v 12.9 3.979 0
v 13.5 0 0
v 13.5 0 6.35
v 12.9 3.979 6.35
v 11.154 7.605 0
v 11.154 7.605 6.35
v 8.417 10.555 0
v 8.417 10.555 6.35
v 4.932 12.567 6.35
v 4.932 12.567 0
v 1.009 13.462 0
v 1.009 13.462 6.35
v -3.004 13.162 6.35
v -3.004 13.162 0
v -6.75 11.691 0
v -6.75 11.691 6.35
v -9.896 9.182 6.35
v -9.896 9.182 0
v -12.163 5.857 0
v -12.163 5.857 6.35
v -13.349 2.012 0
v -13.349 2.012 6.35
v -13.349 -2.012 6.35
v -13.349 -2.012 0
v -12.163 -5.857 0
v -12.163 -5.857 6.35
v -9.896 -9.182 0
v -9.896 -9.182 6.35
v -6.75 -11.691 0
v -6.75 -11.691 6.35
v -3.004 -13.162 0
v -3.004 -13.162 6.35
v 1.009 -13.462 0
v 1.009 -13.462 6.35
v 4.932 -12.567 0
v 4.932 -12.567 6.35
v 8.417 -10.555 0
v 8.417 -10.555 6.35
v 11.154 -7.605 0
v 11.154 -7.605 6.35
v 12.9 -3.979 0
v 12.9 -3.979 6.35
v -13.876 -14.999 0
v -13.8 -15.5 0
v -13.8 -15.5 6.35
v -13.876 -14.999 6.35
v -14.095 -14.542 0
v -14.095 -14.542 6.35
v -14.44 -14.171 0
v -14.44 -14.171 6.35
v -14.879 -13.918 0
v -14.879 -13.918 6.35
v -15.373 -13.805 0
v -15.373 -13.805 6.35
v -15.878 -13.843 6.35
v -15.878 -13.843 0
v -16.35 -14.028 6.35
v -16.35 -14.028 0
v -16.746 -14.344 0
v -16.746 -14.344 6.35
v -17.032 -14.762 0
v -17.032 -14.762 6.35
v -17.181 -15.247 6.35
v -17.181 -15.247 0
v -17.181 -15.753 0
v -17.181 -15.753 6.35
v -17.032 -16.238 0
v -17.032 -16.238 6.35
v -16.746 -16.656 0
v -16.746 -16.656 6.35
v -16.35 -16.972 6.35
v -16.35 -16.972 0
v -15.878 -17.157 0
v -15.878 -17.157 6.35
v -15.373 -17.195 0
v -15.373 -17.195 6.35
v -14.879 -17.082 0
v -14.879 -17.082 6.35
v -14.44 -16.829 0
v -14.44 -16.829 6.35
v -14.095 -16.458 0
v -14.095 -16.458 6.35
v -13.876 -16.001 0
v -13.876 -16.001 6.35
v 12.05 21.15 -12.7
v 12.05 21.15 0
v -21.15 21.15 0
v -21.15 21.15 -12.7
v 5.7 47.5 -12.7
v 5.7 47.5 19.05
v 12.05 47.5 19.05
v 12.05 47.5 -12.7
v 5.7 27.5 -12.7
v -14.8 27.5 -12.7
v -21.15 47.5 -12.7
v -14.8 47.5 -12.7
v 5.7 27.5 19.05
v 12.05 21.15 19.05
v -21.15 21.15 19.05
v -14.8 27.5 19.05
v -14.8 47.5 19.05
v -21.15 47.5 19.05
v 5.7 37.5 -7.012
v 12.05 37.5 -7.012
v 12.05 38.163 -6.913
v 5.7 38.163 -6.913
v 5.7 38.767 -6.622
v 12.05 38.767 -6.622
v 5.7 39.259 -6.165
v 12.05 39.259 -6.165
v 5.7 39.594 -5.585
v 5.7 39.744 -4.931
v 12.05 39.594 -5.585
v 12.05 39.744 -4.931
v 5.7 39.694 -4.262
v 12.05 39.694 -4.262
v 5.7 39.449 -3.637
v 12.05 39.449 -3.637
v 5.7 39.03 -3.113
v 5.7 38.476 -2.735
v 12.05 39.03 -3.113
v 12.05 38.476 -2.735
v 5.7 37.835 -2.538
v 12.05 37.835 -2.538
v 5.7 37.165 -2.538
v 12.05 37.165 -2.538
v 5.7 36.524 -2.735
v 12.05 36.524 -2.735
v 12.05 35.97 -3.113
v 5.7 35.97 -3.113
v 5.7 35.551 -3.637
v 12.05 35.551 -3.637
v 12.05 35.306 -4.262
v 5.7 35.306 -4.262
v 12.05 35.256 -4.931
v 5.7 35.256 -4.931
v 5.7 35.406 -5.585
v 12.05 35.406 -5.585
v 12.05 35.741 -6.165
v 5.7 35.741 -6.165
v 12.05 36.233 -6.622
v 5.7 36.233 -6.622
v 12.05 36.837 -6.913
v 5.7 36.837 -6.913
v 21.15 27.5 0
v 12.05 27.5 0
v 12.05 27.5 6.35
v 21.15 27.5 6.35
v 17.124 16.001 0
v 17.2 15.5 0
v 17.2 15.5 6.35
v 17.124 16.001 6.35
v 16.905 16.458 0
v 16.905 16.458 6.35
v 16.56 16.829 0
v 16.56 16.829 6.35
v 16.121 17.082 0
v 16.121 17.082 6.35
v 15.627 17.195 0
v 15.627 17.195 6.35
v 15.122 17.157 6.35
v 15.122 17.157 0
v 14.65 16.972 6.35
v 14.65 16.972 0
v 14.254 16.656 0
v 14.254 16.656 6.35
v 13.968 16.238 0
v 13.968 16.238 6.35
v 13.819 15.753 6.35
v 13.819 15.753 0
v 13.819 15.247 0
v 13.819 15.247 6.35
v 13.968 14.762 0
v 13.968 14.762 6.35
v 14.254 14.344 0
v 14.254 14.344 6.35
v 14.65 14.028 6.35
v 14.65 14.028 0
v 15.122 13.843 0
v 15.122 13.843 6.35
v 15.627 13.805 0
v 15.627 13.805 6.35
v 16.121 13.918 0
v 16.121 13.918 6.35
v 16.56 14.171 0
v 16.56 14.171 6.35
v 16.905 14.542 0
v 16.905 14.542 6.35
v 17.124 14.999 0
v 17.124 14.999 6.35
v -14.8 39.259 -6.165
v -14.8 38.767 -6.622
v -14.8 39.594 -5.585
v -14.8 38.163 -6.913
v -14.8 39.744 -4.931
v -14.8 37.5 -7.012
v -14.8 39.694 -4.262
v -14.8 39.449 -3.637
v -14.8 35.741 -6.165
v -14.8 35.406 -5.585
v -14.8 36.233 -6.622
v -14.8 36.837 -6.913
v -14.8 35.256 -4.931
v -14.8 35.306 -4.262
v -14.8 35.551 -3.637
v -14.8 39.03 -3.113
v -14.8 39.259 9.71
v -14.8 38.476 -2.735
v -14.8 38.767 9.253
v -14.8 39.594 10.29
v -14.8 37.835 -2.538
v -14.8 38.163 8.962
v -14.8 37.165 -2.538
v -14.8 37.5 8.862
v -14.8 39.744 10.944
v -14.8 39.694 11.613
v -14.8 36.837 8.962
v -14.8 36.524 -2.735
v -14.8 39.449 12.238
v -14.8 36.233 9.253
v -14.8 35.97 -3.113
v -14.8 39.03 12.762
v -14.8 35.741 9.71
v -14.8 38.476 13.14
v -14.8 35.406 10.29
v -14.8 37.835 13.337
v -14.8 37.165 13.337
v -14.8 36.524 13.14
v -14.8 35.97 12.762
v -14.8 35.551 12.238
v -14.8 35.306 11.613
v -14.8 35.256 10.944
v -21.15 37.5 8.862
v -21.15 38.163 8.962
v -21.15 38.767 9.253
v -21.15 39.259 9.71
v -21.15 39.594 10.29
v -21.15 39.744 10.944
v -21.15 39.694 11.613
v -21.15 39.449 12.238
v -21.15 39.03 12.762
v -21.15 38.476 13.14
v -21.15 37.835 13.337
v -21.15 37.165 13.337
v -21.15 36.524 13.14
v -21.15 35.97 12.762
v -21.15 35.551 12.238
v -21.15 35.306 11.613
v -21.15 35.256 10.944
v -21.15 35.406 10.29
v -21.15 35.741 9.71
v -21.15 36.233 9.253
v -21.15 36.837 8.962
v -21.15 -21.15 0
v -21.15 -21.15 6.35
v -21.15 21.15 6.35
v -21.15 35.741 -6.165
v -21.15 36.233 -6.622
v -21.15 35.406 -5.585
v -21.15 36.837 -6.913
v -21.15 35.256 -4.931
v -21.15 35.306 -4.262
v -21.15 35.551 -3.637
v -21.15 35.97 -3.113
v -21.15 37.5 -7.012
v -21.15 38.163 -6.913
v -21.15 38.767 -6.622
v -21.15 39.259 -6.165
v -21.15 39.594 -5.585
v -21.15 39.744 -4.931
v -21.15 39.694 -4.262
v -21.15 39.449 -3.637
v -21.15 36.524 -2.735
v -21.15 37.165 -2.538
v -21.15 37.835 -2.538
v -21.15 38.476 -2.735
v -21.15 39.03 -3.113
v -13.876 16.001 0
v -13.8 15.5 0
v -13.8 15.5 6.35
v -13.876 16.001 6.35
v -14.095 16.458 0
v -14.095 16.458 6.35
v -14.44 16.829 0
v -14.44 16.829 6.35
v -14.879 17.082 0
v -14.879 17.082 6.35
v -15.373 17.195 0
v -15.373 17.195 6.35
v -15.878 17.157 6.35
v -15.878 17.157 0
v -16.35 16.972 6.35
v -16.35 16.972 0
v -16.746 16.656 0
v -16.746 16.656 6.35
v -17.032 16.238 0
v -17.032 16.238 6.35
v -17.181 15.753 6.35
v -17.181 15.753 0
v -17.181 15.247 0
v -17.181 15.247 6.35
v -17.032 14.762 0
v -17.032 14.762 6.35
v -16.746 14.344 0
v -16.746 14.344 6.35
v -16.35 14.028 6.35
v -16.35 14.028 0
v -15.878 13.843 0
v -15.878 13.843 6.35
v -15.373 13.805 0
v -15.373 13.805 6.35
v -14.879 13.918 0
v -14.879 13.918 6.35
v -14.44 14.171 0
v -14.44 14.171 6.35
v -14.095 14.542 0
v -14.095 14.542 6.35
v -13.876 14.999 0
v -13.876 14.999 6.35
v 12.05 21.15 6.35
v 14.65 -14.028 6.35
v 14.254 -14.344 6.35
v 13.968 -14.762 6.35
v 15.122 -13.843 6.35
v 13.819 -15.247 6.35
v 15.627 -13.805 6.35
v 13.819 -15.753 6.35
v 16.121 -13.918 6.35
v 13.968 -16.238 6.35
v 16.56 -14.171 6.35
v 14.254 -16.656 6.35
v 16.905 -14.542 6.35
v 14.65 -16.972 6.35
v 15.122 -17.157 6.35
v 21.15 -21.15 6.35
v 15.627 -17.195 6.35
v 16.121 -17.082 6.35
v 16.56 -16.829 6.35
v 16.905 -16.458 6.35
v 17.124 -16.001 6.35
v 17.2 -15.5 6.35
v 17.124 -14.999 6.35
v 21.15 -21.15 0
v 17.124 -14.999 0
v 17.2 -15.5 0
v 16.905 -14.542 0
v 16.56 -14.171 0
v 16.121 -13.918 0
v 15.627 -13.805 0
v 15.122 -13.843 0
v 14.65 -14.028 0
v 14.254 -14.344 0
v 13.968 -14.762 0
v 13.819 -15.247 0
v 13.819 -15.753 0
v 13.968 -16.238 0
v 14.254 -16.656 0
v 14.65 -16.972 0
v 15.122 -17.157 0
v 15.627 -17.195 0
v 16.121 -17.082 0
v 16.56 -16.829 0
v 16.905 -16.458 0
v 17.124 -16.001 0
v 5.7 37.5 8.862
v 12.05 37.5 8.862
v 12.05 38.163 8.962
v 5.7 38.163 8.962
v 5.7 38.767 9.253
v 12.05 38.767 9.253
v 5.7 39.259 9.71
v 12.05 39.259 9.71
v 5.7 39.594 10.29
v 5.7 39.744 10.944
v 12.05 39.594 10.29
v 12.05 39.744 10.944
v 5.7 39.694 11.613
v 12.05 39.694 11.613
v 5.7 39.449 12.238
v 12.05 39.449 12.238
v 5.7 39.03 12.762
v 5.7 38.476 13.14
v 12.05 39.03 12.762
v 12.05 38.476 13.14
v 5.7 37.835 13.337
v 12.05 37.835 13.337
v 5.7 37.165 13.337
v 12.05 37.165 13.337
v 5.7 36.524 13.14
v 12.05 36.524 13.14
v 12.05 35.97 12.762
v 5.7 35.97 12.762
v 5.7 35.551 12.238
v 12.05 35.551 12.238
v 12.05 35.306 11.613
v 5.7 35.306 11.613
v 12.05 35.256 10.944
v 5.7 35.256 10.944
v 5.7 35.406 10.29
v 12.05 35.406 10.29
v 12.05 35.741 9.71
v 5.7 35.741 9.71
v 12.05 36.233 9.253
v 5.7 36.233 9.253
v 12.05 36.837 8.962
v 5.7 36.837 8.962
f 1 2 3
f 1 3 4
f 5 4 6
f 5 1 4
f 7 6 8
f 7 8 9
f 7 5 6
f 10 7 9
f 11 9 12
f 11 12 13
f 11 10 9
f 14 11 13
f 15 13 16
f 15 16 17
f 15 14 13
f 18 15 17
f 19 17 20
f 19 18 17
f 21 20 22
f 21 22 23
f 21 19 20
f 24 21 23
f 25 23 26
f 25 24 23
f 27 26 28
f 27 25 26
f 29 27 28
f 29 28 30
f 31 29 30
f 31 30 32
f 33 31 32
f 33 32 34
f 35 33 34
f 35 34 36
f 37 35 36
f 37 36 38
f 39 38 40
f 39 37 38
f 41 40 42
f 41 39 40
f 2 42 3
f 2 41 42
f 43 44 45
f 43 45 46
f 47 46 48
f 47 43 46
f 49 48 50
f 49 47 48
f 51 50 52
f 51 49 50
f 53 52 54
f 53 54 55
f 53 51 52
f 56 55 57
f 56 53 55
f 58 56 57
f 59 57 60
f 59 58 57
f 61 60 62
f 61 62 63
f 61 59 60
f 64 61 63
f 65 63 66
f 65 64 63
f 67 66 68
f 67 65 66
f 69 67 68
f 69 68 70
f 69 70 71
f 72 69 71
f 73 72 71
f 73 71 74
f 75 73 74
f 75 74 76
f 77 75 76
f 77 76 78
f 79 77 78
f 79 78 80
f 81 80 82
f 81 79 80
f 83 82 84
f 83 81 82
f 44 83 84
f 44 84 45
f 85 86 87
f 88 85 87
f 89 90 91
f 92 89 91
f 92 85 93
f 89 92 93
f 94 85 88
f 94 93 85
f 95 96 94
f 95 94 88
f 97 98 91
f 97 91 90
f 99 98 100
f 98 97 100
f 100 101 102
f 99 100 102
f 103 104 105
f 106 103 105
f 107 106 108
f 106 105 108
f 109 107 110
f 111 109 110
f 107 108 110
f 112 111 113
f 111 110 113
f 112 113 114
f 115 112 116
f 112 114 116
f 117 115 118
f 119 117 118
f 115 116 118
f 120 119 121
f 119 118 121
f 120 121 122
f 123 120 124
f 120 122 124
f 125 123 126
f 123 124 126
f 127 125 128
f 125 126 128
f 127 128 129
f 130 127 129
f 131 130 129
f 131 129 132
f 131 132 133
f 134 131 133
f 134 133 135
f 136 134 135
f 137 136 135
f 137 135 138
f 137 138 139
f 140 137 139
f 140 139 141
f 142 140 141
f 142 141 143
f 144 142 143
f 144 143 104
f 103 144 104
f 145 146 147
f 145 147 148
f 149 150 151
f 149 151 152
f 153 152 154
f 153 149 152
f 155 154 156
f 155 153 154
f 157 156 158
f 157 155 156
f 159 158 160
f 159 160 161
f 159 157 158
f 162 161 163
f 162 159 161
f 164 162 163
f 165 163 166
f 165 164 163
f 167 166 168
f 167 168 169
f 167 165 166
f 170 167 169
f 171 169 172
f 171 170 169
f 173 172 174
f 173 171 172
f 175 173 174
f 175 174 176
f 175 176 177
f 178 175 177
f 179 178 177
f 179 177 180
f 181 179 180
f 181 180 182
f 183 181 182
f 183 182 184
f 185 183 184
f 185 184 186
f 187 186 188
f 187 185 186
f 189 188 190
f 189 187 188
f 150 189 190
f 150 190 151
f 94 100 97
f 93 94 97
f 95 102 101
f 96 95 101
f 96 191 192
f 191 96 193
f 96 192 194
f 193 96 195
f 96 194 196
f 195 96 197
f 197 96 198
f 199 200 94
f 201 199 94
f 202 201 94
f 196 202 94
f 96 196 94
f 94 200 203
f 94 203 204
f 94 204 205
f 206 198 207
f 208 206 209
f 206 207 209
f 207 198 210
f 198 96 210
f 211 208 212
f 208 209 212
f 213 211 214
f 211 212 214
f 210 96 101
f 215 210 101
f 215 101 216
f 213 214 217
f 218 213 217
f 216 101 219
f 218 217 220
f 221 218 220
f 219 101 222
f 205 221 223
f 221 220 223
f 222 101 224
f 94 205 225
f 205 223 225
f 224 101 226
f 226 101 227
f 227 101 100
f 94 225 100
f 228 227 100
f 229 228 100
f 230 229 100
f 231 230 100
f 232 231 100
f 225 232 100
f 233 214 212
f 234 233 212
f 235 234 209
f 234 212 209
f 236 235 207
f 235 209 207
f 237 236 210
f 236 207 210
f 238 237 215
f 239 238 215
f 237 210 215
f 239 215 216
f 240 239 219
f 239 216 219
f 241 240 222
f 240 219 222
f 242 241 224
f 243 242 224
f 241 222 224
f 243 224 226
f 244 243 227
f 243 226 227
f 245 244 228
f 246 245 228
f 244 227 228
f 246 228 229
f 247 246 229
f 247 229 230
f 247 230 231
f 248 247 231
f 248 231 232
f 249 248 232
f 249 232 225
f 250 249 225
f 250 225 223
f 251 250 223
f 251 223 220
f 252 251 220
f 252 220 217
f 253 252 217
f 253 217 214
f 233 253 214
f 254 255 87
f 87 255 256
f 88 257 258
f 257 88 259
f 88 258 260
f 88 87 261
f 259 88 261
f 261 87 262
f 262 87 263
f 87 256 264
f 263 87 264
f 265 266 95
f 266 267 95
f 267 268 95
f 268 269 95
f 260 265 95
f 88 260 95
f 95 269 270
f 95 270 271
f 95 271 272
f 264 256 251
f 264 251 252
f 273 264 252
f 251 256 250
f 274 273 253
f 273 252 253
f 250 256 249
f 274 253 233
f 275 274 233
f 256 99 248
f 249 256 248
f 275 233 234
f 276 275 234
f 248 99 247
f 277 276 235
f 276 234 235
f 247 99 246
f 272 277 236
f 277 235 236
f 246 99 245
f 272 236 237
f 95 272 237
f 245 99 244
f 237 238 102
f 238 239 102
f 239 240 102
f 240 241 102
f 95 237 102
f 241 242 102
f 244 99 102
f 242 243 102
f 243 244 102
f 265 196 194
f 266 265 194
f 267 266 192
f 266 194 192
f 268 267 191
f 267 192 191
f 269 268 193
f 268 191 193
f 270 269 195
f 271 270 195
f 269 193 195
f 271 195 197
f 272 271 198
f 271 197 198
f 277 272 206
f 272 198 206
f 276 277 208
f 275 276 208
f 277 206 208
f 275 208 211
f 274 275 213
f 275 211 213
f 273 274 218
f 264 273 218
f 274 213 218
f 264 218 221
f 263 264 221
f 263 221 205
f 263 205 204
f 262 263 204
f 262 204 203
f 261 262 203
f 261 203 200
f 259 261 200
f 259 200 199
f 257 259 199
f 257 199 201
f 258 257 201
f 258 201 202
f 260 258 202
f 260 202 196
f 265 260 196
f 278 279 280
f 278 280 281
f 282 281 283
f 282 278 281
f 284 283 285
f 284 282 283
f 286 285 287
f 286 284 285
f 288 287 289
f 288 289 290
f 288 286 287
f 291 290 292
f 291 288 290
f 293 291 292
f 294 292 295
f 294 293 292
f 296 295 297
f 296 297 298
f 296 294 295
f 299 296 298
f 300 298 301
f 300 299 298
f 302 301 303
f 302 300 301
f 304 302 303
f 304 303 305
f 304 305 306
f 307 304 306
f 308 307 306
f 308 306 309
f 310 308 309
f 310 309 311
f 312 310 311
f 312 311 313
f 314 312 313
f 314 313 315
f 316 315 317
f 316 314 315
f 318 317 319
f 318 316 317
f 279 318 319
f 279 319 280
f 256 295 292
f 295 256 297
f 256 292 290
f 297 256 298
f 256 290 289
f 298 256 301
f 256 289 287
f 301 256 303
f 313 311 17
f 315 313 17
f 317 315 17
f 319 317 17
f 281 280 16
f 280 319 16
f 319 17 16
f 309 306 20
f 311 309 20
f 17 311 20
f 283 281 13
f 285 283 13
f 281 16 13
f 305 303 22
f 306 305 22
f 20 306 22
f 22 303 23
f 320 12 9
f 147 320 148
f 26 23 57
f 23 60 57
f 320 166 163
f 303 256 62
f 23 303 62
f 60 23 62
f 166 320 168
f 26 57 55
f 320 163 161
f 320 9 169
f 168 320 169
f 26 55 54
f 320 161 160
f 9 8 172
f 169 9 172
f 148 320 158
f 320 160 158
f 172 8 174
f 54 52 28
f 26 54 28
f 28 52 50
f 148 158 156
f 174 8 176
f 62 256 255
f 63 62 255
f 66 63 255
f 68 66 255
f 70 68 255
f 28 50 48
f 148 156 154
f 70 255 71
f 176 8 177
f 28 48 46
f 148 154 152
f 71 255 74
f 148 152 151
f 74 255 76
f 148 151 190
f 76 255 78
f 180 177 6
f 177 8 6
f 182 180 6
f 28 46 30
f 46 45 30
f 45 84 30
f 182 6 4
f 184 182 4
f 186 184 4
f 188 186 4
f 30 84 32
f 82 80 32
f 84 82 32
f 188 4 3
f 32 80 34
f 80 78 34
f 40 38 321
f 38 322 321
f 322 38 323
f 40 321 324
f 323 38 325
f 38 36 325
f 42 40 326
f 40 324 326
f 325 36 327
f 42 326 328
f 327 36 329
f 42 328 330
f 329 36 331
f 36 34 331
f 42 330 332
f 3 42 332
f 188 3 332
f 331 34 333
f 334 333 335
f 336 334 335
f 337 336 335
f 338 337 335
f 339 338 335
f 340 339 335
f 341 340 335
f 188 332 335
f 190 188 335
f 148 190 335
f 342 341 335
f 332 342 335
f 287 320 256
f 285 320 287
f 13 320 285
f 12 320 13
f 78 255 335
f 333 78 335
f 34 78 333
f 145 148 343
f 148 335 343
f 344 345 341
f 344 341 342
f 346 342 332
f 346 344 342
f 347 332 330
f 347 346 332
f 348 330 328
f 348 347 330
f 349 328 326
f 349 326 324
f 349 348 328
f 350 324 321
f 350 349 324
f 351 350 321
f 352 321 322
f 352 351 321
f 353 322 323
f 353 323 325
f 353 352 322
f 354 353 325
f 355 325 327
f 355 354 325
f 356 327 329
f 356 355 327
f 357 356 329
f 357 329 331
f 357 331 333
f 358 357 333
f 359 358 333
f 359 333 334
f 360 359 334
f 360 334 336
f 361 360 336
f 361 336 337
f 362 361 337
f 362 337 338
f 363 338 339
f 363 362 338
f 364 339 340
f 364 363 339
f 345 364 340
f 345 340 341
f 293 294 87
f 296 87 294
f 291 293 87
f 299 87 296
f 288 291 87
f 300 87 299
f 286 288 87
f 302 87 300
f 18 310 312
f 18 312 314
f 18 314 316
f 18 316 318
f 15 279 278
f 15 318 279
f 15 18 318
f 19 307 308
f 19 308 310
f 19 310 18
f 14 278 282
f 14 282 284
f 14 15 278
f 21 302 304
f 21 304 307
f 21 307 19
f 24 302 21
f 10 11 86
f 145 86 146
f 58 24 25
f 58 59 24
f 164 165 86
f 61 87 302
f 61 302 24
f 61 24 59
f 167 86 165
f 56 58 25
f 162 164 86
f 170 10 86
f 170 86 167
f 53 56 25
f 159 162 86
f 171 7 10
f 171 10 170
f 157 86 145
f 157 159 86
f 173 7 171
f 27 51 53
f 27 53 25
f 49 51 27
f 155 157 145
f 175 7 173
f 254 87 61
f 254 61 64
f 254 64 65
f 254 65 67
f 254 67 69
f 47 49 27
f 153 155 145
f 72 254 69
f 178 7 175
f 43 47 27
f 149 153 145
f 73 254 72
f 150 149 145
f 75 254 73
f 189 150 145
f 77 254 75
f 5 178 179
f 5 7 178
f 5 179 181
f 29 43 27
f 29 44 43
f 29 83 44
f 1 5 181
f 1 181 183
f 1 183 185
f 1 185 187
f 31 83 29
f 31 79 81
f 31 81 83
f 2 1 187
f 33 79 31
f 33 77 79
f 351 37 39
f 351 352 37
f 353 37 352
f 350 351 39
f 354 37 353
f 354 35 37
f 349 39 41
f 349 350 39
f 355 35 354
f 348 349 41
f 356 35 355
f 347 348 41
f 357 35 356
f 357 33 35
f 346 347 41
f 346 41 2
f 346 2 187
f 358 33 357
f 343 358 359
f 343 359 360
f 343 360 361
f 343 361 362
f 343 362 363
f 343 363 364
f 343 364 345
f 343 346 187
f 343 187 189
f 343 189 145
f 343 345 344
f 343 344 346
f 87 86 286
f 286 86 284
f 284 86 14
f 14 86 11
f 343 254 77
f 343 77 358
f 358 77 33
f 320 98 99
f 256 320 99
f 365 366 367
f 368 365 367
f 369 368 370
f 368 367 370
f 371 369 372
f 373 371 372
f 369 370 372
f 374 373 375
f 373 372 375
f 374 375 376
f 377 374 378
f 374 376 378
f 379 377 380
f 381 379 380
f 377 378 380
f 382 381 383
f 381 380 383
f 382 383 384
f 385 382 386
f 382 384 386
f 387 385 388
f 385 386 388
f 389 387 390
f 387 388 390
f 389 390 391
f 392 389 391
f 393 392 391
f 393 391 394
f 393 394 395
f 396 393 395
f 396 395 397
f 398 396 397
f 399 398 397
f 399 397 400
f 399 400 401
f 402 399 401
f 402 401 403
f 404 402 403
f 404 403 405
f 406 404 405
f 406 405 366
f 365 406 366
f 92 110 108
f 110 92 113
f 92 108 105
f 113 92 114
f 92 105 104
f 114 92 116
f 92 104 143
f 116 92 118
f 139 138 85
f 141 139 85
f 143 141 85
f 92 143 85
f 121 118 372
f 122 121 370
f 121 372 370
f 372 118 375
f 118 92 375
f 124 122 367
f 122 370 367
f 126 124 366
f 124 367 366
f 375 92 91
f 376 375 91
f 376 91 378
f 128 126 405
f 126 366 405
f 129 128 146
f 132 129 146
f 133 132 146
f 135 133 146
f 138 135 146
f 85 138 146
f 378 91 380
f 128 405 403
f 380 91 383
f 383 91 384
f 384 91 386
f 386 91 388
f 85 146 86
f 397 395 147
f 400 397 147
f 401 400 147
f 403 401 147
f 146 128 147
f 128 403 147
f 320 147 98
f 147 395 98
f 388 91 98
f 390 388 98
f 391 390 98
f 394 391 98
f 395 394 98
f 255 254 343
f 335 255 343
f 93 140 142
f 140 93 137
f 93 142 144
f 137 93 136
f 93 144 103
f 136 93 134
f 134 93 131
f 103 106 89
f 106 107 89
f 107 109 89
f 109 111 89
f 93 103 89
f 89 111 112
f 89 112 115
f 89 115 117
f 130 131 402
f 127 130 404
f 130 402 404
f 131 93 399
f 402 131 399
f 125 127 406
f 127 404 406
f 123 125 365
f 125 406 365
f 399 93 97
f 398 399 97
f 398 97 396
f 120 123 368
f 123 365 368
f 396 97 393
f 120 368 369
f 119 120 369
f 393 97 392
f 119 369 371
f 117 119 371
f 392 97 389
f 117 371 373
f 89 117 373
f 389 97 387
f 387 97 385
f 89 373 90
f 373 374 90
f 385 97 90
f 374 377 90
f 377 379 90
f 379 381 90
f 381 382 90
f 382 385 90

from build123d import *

# Parameters (mm, degrees)
SKETCH6_W                = 42.3
SKETCH6_H                = 42.3
SKETCH6_R                = 1.7
SKETCH6_R_2              = 13.5
BOSS_EXTRUDE4_DEPTH      = 6.35
SKETCH7_W                = 42.3
SKETCH7_H                = 6.35
BOSS_EXTRUDE5_DEPTH      = 6.35
SKETCH9_W                = 6.35
SKETCH9_H                = 6.35
BOSS_EXTRUDE7_DEPTH      = 20
BOSS_EXTRUDE9_DEPTH      = 12.7
BOSS_EXTRUDE9_DEPTH_BACK = 19.05
CUT_EXTRUDE3_DEPTH       = 62.003217128


with BuildPart() as part:
    # Sketch6 → Boss-Extrude4 (new body)
    with BuildSketch(Plane.XY):
        Rectangle(SKETCH6_W, SKETCH6_H)
        with Locations((-15.5, 15.5)):
            Circle(SKETCH6_R, mode=Mode.SUBTRACT)
        with Locations((15.5, 15.5)):
            Circle(SKETCH6_R, mode=Mode.SUBTRACT)
        with Locations((15.5, -15.5)):
            Circle(SKETCH6_R, mode=Mode.SUBTRACT)
        with Locations((-15.5, -15.5)):
            Circle(SKETCH6_R, mode=Mode.SUBTRACT)
        Circle(SKETCH6_R_2, mode=Mode.SUBTRACT)
    extrude(amount=BOSS_EXTRUDE4_DEPTH)

    # Sketch7 → Boss-Extrude5 (add)
    with BuildSketch(Plane(origin=(0, 21.15, 0), x_dir=(1, 0, 0), z_dir=(0, 1, 0))):
        with Locations((0, -3.175)):
            Rectangle(SKETCH7_W, SKETCH7_H)
    extrude(amount=BOSS_EXTRUDE5_DEPTH)

    # Sketch9 → Boss-Extrude7 (add)
    with BuildSketch(Plane(origin=(0, 27.5, 0), x_dir=(1, 0, 0), z_dir=(0, 1, 0))):
        with Locations((-17.975, -3.175)):
            Rectangle(SKETCH9_W, SKETCH9_H)
        with Locations((8.875, -3.175)):
            Rectangle(SKETCH9_W, SKETCH9_H)
    extrude(amount=BOSS_EXTRUDE7_DEPTH)

    # Sketch11 → Boss-Extrude9 (add, two sides: drawn at the far end of the back side and taken through both)
    with BuildSketch(Plane(origin=(0, 0, 0), x_dir=(-1, 0, 0), z_dir=(0, 0, -1)).offset(-BOSS_EXTRUDE9_DEPTH_BACK)):
        Polygon((-12.05, 47.5), (-12.05, 27.5), (-12.05, 21.15), (21.15, 21.15), (21.15, 47.5), (14.8, 47.5), (14.8, 27.5), (-5.7, 27.5), (-5.7, 47.5), align=None)
    extrude(amount=BOSS_EXTRUDE9_DEPTH + BOSS_EXTRUDE9_DEPTH_BACK)

    # Sketch12 → Cut-Extrude3 (cut, through all)
    with BuildSketch(Plane(origin=(12.05, 0, 0), x_dir=(0, 0, -1), z_dir=(1, 0, 0))):
        with BuildLine():
            ThreePointArc((2.5125, 37.5), (4.7625, 35.25), (7.0125, 37.5))
            Line((7.0125, 37.5), (2.5125, 37.5))
        make_face()
        with BuildLine():
            Line((2.5125, 37.5), (7.0125, 37.5))
            ThreePointArc((7.0125, 37.5), (4.7625, 39.75), (2.5125, 37.5))
        make_face()
        with BuildLine():
            ThreePointArc((-13.3625, 37.5), (-11.1125, 35.25), (-8.8625, 37.5))
            Line((-8.8625, 37.5), (-13.3625, 37.5))
        make_face()
        with BuildLine():
            Line((-13.3625, 37.5), (-8.8625, 37.5))
            ThreePointArc((-8.8625, 37.5), (-11.1125, 39.75), (-13.3625, 37.5))
        make_face()
    extrude(amount=-CUT_EXTRUDE3_DEPTH, mode=Mode.SUBTRACT)


solid = part.part
